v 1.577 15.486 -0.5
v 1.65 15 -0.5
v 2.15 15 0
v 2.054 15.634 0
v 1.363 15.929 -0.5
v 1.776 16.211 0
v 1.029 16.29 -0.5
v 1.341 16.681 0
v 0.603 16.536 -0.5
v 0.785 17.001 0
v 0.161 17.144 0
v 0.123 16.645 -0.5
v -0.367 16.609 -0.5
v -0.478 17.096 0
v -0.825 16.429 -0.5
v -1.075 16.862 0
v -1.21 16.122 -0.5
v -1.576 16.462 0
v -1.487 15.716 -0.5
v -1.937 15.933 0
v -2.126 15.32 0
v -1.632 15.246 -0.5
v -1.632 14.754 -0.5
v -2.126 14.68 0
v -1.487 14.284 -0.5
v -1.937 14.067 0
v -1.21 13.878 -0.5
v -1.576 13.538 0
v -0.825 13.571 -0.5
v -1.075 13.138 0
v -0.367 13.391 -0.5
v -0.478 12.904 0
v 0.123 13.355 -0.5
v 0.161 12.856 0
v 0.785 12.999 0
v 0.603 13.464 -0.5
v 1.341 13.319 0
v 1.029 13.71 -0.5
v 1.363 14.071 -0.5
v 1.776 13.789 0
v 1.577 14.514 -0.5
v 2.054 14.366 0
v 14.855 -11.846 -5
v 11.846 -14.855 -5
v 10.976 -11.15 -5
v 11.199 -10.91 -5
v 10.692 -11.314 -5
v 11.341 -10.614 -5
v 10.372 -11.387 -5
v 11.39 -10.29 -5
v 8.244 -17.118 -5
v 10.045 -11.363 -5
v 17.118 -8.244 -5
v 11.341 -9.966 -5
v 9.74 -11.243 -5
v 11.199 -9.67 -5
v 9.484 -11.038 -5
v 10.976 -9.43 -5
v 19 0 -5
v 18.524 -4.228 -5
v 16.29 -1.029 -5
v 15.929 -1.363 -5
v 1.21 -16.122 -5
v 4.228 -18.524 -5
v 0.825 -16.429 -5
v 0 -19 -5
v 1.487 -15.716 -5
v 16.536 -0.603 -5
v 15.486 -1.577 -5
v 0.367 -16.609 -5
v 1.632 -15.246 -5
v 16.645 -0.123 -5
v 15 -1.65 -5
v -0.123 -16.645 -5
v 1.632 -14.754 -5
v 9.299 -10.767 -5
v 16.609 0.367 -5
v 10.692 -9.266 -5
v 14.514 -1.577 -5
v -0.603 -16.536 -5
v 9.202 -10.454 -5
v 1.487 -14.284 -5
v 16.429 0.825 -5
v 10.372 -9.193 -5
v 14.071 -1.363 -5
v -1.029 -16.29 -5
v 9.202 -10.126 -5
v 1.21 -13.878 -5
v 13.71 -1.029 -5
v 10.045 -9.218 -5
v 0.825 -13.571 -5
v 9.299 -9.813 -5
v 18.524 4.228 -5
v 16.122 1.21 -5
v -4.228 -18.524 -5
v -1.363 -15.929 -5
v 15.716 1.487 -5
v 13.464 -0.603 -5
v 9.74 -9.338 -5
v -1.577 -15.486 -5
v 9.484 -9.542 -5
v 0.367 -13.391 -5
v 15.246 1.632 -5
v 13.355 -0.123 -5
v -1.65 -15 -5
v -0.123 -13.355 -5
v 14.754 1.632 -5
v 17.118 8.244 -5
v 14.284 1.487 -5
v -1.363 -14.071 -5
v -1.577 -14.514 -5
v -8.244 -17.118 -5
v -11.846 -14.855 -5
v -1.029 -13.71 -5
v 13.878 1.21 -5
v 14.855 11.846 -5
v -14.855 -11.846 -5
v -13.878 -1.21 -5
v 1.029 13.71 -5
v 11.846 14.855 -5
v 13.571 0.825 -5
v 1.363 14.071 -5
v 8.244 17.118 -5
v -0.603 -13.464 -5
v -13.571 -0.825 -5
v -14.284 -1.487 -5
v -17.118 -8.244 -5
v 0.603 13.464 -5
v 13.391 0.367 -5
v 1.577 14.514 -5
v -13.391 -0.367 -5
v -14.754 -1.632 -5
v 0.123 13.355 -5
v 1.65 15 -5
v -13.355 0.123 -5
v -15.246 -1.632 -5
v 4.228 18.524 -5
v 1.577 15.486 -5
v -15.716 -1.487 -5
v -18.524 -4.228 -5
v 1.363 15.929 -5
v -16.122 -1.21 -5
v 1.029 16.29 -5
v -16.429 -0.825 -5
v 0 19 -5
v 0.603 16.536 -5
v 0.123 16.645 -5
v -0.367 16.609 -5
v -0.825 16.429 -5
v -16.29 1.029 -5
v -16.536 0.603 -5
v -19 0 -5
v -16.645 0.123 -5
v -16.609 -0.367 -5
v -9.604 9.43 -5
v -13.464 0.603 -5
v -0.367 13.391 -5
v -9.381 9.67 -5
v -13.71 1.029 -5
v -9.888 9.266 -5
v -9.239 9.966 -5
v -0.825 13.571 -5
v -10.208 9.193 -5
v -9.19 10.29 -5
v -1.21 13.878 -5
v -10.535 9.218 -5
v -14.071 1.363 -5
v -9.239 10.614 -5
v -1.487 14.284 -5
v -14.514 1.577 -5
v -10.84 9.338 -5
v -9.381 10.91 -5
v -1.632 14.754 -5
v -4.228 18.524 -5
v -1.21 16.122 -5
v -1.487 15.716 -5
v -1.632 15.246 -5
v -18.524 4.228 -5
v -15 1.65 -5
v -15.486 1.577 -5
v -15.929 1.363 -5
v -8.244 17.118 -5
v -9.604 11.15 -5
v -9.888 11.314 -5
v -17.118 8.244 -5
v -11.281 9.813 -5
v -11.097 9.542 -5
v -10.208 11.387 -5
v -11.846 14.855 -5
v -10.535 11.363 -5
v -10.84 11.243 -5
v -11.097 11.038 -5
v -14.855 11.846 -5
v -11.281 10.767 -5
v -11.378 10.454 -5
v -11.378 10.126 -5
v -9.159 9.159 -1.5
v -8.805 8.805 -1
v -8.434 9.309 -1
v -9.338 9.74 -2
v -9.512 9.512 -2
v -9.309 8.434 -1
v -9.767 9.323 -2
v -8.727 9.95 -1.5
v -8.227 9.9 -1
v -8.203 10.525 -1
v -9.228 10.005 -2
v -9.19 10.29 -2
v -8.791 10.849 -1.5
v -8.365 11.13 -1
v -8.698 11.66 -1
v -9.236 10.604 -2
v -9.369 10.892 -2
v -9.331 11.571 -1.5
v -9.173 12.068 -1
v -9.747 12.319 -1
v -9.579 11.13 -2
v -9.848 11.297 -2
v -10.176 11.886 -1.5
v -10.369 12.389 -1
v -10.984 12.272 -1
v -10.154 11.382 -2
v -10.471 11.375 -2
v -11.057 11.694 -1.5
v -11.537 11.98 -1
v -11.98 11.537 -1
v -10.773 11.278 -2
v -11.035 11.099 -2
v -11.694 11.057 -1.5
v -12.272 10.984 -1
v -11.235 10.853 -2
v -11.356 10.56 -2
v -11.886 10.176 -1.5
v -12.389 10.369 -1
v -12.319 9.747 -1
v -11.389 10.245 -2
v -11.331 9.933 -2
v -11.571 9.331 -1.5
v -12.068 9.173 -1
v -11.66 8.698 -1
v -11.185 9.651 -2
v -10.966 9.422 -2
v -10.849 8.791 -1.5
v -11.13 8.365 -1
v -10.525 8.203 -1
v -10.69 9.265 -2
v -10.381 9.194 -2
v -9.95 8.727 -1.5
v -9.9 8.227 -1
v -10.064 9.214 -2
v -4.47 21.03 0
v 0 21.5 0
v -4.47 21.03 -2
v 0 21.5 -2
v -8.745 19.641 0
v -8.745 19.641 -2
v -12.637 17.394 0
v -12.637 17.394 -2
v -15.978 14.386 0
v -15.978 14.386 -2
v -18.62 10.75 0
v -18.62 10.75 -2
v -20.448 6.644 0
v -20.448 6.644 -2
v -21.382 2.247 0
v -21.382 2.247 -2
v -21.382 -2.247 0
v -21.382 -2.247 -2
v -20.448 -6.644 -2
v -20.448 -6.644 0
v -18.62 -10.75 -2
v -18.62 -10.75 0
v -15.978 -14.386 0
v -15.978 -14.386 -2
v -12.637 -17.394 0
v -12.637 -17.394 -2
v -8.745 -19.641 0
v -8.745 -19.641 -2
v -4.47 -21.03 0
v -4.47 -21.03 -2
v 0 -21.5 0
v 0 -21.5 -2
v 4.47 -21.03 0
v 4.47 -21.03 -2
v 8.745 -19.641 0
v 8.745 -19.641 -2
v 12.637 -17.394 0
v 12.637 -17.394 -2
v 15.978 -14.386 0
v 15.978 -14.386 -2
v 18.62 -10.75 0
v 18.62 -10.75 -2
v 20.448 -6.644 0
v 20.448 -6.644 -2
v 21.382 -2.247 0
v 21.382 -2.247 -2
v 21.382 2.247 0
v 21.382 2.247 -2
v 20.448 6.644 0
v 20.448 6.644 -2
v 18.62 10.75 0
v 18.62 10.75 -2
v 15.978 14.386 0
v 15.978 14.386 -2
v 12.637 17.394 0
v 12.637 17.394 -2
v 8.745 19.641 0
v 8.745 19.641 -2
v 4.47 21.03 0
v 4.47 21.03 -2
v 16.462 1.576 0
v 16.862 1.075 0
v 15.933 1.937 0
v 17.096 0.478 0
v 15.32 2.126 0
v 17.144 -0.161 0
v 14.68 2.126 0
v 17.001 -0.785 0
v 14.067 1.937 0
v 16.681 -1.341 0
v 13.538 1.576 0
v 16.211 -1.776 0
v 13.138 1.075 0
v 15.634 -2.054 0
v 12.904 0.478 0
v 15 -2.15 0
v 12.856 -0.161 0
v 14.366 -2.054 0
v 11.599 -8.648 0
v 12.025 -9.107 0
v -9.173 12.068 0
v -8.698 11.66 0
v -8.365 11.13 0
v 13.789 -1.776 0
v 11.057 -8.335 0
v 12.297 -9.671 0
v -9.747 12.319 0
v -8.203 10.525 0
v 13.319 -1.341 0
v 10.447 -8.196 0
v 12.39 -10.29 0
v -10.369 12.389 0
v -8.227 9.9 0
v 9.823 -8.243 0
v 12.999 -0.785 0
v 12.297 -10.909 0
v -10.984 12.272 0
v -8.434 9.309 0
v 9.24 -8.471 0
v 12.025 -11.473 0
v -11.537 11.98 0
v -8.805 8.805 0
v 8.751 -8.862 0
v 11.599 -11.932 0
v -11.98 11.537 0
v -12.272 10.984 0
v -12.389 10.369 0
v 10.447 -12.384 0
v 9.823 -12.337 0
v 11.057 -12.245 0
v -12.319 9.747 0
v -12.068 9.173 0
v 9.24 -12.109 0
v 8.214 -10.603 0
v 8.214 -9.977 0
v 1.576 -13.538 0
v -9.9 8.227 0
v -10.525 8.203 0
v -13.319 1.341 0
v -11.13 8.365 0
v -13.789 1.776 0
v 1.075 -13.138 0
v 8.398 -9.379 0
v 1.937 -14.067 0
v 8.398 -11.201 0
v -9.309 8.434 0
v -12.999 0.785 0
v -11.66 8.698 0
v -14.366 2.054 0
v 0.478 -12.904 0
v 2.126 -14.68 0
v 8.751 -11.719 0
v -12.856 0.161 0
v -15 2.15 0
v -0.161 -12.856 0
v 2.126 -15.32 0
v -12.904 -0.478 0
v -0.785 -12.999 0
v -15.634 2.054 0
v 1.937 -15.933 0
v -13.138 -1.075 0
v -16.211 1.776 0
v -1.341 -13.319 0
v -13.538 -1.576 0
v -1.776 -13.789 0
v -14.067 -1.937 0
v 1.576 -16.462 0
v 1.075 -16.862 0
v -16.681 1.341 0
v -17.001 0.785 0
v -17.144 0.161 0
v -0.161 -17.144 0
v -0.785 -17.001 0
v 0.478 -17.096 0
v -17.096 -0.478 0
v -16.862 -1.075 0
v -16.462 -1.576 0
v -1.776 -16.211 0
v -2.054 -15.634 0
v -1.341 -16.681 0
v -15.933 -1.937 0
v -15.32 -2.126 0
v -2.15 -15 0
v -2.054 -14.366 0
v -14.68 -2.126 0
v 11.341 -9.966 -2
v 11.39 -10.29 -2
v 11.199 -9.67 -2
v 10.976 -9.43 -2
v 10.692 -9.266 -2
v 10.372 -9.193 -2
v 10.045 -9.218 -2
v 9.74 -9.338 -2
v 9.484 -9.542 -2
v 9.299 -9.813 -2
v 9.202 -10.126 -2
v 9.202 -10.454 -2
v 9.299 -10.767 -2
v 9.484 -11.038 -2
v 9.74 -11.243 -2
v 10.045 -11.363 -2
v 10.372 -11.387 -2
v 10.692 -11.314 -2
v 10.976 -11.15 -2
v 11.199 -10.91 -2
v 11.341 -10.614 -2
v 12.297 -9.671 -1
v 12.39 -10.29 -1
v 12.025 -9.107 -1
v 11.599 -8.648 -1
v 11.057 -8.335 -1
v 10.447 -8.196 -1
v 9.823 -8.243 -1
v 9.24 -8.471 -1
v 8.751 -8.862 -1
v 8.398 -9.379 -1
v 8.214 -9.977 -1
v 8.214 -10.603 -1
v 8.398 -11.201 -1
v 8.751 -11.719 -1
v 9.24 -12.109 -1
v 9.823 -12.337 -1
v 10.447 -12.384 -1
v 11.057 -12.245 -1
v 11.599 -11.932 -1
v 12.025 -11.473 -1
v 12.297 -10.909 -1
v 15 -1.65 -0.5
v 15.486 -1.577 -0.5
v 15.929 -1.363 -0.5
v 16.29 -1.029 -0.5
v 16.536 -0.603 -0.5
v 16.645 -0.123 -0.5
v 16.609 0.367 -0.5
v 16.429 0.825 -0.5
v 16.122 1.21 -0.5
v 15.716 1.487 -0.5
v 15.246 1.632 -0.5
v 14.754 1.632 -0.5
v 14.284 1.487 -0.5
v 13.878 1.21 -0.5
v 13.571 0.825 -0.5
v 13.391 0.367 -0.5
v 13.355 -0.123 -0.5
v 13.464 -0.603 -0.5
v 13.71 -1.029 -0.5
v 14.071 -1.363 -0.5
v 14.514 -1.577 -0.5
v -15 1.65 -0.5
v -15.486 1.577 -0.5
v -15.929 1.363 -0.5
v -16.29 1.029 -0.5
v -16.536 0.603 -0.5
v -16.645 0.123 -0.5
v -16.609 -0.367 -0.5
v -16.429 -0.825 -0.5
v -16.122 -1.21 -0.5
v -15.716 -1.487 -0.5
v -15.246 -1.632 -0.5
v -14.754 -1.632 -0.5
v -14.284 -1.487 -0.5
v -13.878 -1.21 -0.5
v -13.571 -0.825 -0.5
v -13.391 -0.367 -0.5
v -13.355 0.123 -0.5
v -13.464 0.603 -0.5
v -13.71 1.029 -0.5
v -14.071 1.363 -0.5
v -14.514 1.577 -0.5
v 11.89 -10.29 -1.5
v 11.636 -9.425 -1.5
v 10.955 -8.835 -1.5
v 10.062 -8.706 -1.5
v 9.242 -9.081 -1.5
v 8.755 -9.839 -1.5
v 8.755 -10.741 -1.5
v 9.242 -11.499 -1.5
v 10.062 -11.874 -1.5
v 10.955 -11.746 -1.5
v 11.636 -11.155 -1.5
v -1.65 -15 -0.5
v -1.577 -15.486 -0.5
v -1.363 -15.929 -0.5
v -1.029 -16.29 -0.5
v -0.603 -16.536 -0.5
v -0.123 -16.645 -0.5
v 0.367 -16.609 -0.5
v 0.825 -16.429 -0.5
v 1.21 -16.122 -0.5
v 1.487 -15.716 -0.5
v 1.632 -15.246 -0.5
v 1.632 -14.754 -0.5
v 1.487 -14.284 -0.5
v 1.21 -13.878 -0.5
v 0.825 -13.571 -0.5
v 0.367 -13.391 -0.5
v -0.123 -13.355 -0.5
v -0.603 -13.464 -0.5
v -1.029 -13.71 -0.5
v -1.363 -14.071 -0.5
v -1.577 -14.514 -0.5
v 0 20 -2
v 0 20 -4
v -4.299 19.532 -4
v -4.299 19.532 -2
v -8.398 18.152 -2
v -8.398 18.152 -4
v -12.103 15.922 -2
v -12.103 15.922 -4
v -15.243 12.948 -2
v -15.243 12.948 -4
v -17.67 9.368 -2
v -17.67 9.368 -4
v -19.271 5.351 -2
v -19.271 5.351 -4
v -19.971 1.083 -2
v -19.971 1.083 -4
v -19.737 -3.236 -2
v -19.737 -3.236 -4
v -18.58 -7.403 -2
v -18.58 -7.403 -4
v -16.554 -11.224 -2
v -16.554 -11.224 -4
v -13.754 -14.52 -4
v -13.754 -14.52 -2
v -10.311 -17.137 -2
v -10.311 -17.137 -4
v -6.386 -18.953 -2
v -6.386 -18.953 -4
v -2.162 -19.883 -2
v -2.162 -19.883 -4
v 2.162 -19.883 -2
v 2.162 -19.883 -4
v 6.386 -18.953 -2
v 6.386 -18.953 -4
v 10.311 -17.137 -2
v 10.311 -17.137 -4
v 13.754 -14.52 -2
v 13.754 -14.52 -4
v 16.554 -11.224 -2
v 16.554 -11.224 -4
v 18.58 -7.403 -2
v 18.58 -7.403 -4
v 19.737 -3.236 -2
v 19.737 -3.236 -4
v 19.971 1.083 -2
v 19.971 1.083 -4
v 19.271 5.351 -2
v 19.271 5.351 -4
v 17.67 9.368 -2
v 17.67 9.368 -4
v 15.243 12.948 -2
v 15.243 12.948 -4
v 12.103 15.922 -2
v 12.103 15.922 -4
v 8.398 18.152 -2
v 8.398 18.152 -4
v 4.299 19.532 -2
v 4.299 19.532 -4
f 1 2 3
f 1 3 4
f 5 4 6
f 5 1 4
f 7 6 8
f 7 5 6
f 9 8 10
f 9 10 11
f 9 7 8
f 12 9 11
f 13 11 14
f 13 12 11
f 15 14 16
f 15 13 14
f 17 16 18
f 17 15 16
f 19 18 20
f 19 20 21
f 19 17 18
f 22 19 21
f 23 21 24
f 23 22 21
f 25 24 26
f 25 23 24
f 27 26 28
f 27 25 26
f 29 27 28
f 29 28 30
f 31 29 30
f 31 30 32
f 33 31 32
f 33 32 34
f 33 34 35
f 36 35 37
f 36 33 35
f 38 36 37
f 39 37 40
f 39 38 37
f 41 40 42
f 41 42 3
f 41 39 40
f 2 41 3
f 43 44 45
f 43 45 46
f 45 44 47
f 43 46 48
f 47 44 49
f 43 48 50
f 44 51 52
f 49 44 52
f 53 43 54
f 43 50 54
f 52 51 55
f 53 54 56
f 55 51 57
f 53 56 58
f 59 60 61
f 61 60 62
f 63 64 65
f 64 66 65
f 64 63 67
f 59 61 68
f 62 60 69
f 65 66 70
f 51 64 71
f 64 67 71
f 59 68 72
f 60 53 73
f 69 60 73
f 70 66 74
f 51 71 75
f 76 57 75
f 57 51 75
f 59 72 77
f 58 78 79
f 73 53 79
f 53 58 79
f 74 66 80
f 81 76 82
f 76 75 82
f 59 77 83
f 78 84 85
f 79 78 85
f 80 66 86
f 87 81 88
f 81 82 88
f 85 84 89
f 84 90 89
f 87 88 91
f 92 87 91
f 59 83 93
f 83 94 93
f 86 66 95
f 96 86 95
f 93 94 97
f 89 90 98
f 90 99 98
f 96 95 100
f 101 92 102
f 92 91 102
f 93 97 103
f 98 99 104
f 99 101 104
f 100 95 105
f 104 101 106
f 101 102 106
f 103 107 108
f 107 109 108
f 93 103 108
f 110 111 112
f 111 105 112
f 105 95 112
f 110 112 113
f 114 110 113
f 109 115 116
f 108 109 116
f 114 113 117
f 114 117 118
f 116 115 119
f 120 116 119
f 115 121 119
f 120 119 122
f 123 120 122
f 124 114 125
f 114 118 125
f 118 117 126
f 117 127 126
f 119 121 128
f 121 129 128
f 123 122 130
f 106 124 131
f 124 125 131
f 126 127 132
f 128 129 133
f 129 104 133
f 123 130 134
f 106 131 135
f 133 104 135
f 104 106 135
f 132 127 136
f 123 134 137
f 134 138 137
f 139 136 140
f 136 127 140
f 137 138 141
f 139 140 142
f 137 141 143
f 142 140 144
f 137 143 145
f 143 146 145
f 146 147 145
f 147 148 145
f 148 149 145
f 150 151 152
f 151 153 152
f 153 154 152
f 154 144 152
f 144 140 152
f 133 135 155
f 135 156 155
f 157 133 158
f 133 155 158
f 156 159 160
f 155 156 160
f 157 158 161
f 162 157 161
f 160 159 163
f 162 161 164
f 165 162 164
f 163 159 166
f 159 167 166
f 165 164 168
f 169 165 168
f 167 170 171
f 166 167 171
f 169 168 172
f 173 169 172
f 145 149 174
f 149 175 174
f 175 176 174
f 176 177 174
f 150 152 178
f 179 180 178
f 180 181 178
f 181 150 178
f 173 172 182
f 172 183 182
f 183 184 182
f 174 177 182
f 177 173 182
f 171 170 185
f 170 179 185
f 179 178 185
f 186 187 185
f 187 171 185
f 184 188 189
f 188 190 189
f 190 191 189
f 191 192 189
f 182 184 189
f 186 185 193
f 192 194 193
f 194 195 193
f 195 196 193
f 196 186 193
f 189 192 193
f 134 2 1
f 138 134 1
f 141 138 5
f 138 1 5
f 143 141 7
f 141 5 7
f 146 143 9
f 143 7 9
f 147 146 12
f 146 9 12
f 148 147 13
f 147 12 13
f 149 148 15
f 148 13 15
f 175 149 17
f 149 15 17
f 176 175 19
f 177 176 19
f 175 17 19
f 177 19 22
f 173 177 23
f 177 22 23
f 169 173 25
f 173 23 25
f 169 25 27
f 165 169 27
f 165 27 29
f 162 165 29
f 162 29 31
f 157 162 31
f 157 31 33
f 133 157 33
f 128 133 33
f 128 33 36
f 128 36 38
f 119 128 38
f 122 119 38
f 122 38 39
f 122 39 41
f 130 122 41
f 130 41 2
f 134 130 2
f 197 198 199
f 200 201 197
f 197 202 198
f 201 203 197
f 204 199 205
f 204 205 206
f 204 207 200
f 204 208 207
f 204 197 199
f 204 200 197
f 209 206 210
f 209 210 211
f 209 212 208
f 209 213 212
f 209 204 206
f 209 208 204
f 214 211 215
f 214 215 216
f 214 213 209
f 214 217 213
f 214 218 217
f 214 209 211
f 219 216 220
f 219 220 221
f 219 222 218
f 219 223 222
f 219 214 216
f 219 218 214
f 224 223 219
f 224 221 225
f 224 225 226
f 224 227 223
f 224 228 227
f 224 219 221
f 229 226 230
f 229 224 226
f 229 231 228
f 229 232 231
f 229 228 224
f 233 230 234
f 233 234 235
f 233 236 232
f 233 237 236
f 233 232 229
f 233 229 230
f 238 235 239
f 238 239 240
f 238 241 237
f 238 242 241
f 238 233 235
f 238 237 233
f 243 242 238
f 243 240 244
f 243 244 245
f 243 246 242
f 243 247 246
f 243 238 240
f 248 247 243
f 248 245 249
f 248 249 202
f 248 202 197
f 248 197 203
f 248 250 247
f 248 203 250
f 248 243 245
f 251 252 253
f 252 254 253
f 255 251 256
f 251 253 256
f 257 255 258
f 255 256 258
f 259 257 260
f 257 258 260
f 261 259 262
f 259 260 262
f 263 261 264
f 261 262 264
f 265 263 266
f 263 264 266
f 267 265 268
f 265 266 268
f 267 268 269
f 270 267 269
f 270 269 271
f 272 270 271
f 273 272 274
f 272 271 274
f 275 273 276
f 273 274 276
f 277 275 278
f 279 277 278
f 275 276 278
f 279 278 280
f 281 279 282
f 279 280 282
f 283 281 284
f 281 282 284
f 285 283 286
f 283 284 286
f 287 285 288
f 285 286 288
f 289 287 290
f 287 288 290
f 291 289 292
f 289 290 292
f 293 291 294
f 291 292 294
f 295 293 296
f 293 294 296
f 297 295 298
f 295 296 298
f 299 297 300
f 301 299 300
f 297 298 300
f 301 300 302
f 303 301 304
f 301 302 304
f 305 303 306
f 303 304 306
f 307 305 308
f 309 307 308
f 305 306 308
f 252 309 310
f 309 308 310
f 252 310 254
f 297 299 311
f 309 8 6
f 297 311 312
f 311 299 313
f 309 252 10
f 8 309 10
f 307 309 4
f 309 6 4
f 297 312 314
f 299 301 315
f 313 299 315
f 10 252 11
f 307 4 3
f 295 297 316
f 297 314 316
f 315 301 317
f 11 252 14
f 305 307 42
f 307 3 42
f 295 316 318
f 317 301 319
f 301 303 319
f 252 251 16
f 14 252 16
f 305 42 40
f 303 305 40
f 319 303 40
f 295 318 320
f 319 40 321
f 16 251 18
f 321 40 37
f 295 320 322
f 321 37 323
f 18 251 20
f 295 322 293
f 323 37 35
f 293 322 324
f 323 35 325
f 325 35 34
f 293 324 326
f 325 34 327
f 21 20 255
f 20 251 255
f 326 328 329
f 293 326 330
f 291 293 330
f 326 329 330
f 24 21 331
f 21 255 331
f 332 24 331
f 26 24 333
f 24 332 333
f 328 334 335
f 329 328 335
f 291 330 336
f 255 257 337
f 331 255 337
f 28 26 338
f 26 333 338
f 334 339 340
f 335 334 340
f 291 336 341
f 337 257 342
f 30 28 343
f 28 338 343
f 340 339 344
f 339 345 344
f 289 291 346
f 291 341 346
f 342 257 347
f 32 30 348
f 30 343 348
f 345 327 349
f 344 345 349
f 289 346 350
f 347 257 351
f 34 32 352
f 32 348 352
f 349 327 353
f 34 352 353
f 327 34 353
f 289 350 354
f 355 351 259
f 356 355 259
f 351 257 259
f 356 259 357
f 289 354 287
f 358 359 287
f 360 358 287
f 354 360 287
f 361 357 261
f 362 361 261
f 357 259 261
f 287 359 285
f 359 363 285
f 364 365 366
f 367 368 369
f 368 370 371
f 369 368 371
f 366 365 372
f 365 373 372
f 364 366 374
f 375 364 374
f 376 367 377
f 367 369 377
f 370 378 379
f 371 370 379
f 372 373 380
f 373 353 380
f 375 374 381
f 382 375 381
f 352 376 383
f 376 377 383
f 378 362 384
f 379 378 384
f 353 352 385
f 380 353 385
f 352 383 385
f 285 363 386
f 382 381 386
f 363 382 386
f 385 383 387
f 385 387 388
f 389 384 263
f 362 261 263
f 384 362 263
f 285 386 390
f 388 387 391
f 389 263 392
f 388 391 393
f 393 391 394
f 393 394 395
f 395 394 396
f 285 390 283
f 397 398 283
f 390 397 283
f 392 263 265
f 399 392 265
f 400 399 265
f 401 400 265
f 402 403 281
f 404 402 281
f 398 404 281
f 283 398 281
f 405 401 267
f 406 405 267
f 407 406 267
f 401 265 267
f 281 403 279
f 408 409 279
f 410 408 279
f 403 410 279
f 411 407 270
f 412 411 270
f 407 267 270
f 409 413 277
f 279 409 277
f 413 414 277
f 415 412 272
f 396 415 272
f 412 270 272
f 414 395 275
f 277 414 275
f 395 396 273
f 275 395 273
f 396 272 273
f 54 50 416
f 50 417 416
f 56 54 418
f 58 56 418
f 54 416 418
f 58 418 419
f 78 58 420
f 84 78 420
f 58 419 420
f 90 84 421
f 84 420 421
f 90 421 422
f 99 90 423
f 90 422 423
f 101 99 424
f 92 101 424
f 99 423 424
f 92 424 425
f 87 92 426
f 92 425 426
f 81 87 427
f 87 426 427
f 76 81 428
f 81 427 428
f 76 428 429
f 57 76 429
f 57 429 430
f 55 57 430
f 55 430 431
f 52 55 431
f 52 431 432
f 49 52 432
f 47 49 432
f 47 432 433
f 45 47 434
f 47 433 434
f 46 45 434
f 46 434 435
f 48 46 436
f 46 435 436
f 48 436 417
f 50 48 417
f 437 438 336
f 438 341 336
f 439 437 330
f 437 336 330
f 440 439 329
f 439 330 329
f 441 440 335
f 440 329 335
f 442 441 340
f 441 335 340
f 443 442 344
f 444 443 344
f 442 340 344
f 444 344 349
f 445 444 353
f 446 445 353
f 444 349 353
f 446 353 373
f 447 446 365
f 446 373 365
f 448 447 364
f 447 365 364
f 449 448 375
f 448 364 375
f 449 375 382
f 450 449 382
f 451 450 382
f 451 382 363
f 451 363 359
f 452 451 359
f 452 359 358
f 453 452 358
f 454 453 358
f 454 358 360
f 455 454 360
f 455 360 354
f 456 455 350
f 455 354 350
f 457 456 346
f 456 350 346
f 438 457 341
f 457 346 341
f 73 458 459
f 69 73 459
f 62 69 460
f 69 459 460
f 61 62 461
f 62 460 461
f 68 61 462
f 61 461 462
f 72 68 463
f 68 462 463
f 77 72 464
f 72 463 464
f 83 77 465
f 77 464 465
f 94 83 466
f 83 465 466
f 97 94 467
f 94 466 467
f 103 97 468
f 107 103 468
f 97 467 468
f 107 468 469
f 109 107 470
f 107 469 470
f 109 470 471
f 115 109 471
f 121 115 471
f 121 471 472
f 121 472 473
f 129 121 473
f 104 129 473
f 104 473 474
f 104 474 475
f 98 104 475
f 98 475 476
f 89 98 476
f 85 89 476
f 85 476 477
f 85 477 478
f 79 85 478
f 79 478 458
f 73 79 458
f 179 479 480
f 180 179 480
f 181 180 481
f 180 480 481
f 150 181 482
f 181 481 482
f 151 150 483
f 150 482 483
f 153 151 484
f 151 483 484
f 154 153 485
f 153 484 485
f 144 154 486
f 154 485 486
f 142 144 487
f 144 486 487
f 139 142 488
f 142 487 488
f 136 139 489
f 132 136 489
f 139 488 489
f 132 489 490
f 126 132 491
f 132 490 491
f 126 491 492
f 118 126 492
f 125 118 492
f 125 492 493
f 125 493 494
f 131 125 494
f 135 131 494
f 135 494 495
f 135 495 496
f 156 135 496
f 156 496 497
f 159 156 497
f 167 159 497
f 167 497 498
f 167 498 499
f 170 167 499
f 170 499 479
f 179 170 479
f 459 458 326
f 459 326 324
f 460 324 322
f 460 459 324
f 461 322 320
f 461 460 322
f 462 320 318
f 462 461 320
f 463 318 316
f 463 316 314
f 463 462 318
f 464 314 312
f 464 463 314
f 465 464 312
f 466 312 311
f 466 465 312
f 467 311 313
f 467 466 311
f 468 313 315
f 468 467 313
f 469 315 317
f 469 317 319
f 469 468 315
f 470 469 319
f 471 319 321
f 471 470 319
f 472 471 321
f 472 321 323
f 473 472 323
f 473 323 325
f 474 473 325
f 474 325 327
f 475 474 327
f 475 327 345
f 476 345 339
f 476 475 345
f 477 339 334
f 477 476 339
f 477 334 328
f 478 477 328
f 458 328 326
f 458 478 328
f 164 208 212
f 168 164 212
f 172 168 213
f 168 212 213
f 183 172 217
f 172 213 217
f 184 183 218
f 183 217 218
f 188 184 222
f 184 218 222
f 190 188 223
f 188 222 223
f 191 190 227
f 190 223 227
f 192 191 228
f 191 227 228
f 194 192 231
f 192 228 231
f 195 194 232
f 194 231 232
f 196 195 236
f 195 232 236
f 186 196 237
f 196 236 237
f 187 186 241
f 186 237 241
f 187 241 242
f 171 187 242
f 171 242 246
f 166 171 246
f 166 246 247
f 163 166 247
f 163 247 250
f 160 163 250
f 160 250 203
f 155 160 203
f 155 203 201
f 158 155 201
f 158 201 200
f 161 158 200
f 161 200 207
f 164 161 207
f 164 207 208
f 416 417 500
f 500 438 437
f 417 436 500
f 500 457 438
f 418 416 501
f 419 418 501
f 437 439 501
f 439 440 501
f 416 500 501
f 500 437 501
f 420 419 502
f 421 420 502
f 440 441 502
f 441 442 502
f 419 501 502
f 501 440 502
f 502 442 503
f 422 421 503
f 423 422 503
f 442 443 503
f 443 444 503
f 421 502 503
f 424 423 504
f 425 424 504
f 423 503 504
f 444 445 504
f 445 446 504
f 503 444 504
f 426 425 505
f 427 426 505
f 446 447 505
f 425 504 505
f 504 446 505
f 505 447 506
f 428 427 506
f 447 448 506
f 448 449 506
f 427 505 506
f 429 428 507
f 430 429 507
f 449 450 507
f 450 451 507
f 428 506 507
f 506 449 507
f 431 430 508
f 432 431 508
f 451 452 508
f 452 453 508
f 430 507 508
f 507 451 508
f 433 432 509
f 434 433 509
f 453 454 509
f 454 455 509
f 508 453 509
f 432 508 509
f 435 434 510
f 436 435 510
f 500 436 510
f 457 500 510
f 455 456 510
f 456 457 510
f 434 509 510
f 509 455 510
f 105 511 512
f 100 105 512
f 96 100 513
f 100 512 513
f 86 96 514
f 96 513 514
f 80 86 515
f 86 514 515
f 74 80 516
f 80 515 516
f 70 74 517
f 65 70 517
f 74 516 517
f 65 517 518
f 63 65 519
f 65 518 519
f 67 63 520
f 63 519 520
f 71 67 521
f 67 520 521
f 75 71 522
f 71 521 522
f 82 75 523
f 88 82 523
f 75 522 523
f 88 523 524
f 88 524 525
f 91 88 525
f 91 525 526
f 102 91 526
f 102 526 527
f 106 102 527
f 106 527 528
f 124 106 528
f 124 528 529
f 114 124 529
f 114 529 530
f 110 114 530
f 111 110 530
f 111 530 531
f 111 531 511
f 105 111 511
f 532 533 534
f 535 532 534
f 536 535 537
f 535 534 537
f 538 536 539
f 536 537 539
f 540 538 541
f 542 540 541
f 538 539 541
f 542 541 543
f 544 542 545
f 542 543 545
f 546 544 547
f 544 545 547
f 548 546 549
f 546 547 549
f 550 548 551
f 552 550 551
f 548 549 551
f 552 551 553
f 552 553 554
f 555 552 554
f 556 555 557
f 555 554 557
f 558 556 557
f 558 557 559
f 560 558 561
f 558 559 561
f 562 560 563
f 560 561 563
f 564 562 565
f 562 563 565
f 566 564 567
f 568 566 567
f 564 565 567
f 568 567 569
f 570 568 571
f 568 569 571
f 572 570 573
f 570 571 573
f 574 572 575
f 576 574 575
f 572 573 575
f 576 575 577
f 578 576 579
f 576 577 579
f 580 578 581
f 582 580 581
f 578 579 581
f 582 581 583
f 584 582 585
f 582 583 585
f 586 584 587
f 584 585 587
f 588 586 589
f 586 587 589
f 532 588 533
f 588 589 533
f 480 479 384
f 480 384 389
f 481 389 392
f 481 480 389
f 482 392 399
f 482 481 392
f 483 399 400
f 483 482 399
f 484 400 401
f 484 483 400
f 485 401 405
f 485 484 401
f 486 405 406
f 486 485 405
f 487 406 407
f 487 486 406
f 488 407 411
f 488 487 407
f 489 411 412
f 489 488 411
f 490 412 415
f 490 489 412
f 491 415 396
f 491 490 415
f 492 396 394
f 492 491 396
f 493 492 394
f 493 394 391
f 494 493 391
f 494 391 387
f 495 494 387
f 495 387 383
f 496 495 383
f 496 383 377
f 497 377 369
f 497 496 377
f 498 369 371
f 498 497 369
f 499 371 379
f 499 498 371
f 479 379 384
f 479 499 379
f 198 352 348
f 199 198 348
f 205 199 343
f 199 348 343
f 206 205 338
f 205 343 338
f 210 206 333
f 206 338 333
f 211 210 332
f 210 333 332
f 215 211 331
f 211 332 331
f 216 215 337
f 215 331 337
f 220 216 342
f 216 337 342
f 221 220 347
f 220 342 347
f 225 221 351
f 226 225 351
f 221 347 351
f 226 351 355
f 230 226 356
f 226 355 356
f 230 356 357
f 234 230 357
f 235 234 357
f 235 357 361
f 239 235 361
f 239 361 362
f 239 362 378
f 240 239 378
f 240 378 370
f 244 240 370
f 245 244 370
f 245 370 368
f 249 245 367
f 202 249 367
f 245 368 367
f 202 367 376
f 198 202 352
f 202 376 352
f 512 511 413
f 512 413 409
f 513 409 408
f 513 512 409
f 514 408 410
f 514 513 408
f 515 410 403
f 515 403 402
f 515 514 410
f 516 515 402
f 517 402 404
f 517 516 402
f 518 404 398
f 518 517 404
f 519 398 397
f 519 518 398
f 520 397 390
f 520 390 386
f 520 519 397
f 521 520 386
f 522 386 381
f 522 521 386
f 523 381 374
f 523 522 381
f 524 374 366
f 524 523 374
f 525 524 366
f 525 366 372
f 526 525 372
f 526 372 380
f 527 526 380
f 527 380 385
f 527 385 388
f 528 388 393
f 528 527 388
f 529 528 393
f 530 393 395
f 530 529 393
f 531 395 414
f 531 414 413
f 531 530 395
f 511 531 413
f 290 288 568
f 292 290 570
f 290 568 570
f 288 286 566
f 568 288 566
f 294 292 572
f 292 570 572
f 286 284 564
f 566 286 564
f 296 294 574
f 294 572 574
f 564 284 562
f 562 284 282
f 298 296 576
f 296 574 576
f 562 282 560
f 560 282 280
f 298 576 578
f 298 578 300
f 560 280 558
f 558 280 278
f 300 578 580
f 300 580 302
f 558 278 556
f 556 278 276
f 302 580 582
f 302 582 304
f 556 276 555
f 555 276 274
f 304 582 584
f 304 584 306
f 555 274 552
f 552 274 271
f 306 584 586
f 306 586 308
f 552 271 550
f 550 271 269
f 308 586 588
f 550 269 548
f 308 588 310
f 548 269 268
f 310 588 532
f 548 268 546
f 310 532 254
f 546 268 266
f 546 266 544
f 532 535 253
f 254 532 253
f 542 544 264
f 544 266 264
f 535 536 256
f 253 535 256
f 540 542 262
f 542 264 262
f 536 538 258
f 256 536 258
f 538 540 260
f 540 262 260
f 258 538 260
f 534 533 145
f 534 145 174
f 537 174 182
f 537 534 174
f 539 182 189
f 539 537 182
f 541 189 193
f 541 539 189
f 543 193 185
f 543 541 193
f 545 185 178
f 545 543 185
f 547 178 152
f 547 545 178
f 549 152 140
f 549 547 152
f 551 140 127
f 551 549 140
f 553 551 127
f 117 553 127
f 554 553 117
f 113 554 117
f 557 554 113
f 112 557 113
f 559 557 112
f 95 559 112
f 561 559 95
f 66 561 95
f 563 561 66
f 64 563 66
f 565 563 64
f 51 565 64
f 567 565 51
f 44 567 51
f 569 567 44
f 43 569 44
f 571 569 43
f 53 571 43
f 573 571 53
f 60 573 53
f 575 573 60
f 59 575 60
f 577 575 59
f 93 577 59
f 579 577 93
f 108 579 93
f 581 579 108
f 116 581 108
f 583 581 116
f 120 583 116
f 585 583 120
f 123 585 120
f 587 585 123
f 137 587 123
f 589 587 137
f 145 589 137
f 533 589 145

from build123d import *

# Parameters (mm, degrees)
SKETCH2_R                    = 1.6500000000000001
CUT_EXTRUDE1_DEPTH           = 10
CHAMFER1_SIZE                = 0.5
CIRPATTERN1_COUNT            = 4
CHAMFER1_OF_CIRPATTERN1_SIZE = 0.5
CUT_EXTRUDE2_DEPTH           = 2
CHAMFER2_SIZE                = 1
SKETCH4_R                    = 1.09999999999999
CUT_EXTRUDE3_DEPTH           = 31.553232234904378
CHAMFER3_SIZE                = 1


# Read off the part's stored shape, not the designer's step: CirPattern2
with BuildPart() as part:
    # Sketch1 → Revolve1 (revolve)
    with BuildSketch(Plane(origin=(0, 0, 0), x_dir=(0, 0, -1), z_dir=(1, 0, 0))):
        Polygon((0, 0), (0, 21.5), (2, 21.5), (2, 20), (4.999999999999999, 20), (5.000000000000003, -1.7e-16), align=None)
    revolve(axis=Axis((0, -1.7e-16, -5.000000000000003), (0, 3e-17, 1)))

    # Sketch2 → Cut-Extrude1 (cut)
    with BuildSketch(Plane.XY):
        with Locations((0, 15)):
            Circle(SKETCH2_R)
    cut_extrude1 = extrude(amount=-CUT_EXTRUDE1_DEPTH, mode=Mode.SUBTRACT)

    # Chamfer1
    chamfer1_edges = [part.edges().sort_by_distance(p)[0] for p in [
        (-1.6500000000000001, 15.000000000000002, 0),
    ]]
    chamfer(chamfer1_edges, length=CHAMFER1_SIZE)

    # CirPattern1: Cut-Extrude1 ×4 about axis
    cirpattern1_axis = Axis((-2.619e-14, -5e-17, 0), (0, 0, 1))
    for i in range(1, CIRPATTERN1_COUNT):
        add(cut_extrude1.rotate(cirpattern1_axis, i * 360 / CIRPATTERN1_COUNT), mode=Mode.SUBTRACT)

    # Chamfer1 of CirPattern1
    chamfer1_of_cirpattern1_edges = [part.edges().sort_by_distance(p)[0] for p in [
        (-15.000000000000028, -1.649999999999973, 0),
        (1.649999999999946, -15.000000000000002, 0),
        (14.999999999999975, 1.6499999999999713, 0),
    ]]
    chamfer(chamfer1_of_cirpattern1_edges, length=CHAMFER1_OF_CIRPATTERN1_SIZE)

    # Sketch3 → Cut-Extrude2 (cut)
    with BuildSketch(Plane.XY):
        with BuildLine():
            ThreePointArc((-11.775069570500428, 11.77506957050046), (-11.77506957050042, 8.805221089516952), (-8.805221089516914, 8.805221089516971))
            Line((-8.805221089516925, 8.805221089516953), (-11.775069570500422, 11.77506957050046))
        make_face()
        with BuildLine():
            Line((-11.775069570500422, 11.77506957050046), (-8.805221089516925, 8.805221089516953))
            ThreePointArc((-8.805221089516914, 8.805221089516971), (-8.34999831173497, 9.486510122042029), (-8.190145330008676, 10.29014533000871))
            ThreePointArc((-8.190145330008676, 10.29014533000871), (-9.486510122041988, 12.230292348282413), (-11.775069570500428, 11.77506957050046))
        make_face()
    extrude(amount=-CUT_EXTRUDE2_DEPTH, mode=Mode.SUBTRACT)

    # Chamfer2
    chamfer2_edges = [part.edges().sort_by_distance(p)[0] for p in [
        (-11.775069570500419, 11.775069570500454, -2),
    ]]
    chamfer(chamfer2_edges, length=CHAMFER2_SIZE)

    # Sketch4 → Cut-Extrude3 (cut, through all)
    with BuildSketch(Plane.XY.offset(-2)):
        with Locations((-10.290145330008677, 10.29014533000871)):
            Circle(SKETCH4_R)
    extrude(amount=-CUT_EXTRUDE3_DEPTH, mode=Mode.SUBTRACT)

    # CirPattern2 outline → CirPattern2 (revolve, cut)
    with BuildSketch(Plane(origin=(10.29014533, -10.29014533, 0), x_dir=(1, 0, 0), z_dir=(0, -1, 0))):
        Polygon((1.1, -2), (2.1, -1), (2.1, 0), (0, 0), (0, -5), (1.1, -5), align=None)
    revolve(axis=Axis((10.29014533, -10.29014533, 0), (0, 0, 1)), mode=Mode.SUBTRACT)

    # Chamfer3
    chamfer3_edges = [part.edges().sort_by_distance(p)[0] for p in [
        (-2.45e-15, -20, -4.999999999999997),
    ]]
    chamfer(chamfer3_edges, length=CHAMFER3_SIZE)


solid = part.part
